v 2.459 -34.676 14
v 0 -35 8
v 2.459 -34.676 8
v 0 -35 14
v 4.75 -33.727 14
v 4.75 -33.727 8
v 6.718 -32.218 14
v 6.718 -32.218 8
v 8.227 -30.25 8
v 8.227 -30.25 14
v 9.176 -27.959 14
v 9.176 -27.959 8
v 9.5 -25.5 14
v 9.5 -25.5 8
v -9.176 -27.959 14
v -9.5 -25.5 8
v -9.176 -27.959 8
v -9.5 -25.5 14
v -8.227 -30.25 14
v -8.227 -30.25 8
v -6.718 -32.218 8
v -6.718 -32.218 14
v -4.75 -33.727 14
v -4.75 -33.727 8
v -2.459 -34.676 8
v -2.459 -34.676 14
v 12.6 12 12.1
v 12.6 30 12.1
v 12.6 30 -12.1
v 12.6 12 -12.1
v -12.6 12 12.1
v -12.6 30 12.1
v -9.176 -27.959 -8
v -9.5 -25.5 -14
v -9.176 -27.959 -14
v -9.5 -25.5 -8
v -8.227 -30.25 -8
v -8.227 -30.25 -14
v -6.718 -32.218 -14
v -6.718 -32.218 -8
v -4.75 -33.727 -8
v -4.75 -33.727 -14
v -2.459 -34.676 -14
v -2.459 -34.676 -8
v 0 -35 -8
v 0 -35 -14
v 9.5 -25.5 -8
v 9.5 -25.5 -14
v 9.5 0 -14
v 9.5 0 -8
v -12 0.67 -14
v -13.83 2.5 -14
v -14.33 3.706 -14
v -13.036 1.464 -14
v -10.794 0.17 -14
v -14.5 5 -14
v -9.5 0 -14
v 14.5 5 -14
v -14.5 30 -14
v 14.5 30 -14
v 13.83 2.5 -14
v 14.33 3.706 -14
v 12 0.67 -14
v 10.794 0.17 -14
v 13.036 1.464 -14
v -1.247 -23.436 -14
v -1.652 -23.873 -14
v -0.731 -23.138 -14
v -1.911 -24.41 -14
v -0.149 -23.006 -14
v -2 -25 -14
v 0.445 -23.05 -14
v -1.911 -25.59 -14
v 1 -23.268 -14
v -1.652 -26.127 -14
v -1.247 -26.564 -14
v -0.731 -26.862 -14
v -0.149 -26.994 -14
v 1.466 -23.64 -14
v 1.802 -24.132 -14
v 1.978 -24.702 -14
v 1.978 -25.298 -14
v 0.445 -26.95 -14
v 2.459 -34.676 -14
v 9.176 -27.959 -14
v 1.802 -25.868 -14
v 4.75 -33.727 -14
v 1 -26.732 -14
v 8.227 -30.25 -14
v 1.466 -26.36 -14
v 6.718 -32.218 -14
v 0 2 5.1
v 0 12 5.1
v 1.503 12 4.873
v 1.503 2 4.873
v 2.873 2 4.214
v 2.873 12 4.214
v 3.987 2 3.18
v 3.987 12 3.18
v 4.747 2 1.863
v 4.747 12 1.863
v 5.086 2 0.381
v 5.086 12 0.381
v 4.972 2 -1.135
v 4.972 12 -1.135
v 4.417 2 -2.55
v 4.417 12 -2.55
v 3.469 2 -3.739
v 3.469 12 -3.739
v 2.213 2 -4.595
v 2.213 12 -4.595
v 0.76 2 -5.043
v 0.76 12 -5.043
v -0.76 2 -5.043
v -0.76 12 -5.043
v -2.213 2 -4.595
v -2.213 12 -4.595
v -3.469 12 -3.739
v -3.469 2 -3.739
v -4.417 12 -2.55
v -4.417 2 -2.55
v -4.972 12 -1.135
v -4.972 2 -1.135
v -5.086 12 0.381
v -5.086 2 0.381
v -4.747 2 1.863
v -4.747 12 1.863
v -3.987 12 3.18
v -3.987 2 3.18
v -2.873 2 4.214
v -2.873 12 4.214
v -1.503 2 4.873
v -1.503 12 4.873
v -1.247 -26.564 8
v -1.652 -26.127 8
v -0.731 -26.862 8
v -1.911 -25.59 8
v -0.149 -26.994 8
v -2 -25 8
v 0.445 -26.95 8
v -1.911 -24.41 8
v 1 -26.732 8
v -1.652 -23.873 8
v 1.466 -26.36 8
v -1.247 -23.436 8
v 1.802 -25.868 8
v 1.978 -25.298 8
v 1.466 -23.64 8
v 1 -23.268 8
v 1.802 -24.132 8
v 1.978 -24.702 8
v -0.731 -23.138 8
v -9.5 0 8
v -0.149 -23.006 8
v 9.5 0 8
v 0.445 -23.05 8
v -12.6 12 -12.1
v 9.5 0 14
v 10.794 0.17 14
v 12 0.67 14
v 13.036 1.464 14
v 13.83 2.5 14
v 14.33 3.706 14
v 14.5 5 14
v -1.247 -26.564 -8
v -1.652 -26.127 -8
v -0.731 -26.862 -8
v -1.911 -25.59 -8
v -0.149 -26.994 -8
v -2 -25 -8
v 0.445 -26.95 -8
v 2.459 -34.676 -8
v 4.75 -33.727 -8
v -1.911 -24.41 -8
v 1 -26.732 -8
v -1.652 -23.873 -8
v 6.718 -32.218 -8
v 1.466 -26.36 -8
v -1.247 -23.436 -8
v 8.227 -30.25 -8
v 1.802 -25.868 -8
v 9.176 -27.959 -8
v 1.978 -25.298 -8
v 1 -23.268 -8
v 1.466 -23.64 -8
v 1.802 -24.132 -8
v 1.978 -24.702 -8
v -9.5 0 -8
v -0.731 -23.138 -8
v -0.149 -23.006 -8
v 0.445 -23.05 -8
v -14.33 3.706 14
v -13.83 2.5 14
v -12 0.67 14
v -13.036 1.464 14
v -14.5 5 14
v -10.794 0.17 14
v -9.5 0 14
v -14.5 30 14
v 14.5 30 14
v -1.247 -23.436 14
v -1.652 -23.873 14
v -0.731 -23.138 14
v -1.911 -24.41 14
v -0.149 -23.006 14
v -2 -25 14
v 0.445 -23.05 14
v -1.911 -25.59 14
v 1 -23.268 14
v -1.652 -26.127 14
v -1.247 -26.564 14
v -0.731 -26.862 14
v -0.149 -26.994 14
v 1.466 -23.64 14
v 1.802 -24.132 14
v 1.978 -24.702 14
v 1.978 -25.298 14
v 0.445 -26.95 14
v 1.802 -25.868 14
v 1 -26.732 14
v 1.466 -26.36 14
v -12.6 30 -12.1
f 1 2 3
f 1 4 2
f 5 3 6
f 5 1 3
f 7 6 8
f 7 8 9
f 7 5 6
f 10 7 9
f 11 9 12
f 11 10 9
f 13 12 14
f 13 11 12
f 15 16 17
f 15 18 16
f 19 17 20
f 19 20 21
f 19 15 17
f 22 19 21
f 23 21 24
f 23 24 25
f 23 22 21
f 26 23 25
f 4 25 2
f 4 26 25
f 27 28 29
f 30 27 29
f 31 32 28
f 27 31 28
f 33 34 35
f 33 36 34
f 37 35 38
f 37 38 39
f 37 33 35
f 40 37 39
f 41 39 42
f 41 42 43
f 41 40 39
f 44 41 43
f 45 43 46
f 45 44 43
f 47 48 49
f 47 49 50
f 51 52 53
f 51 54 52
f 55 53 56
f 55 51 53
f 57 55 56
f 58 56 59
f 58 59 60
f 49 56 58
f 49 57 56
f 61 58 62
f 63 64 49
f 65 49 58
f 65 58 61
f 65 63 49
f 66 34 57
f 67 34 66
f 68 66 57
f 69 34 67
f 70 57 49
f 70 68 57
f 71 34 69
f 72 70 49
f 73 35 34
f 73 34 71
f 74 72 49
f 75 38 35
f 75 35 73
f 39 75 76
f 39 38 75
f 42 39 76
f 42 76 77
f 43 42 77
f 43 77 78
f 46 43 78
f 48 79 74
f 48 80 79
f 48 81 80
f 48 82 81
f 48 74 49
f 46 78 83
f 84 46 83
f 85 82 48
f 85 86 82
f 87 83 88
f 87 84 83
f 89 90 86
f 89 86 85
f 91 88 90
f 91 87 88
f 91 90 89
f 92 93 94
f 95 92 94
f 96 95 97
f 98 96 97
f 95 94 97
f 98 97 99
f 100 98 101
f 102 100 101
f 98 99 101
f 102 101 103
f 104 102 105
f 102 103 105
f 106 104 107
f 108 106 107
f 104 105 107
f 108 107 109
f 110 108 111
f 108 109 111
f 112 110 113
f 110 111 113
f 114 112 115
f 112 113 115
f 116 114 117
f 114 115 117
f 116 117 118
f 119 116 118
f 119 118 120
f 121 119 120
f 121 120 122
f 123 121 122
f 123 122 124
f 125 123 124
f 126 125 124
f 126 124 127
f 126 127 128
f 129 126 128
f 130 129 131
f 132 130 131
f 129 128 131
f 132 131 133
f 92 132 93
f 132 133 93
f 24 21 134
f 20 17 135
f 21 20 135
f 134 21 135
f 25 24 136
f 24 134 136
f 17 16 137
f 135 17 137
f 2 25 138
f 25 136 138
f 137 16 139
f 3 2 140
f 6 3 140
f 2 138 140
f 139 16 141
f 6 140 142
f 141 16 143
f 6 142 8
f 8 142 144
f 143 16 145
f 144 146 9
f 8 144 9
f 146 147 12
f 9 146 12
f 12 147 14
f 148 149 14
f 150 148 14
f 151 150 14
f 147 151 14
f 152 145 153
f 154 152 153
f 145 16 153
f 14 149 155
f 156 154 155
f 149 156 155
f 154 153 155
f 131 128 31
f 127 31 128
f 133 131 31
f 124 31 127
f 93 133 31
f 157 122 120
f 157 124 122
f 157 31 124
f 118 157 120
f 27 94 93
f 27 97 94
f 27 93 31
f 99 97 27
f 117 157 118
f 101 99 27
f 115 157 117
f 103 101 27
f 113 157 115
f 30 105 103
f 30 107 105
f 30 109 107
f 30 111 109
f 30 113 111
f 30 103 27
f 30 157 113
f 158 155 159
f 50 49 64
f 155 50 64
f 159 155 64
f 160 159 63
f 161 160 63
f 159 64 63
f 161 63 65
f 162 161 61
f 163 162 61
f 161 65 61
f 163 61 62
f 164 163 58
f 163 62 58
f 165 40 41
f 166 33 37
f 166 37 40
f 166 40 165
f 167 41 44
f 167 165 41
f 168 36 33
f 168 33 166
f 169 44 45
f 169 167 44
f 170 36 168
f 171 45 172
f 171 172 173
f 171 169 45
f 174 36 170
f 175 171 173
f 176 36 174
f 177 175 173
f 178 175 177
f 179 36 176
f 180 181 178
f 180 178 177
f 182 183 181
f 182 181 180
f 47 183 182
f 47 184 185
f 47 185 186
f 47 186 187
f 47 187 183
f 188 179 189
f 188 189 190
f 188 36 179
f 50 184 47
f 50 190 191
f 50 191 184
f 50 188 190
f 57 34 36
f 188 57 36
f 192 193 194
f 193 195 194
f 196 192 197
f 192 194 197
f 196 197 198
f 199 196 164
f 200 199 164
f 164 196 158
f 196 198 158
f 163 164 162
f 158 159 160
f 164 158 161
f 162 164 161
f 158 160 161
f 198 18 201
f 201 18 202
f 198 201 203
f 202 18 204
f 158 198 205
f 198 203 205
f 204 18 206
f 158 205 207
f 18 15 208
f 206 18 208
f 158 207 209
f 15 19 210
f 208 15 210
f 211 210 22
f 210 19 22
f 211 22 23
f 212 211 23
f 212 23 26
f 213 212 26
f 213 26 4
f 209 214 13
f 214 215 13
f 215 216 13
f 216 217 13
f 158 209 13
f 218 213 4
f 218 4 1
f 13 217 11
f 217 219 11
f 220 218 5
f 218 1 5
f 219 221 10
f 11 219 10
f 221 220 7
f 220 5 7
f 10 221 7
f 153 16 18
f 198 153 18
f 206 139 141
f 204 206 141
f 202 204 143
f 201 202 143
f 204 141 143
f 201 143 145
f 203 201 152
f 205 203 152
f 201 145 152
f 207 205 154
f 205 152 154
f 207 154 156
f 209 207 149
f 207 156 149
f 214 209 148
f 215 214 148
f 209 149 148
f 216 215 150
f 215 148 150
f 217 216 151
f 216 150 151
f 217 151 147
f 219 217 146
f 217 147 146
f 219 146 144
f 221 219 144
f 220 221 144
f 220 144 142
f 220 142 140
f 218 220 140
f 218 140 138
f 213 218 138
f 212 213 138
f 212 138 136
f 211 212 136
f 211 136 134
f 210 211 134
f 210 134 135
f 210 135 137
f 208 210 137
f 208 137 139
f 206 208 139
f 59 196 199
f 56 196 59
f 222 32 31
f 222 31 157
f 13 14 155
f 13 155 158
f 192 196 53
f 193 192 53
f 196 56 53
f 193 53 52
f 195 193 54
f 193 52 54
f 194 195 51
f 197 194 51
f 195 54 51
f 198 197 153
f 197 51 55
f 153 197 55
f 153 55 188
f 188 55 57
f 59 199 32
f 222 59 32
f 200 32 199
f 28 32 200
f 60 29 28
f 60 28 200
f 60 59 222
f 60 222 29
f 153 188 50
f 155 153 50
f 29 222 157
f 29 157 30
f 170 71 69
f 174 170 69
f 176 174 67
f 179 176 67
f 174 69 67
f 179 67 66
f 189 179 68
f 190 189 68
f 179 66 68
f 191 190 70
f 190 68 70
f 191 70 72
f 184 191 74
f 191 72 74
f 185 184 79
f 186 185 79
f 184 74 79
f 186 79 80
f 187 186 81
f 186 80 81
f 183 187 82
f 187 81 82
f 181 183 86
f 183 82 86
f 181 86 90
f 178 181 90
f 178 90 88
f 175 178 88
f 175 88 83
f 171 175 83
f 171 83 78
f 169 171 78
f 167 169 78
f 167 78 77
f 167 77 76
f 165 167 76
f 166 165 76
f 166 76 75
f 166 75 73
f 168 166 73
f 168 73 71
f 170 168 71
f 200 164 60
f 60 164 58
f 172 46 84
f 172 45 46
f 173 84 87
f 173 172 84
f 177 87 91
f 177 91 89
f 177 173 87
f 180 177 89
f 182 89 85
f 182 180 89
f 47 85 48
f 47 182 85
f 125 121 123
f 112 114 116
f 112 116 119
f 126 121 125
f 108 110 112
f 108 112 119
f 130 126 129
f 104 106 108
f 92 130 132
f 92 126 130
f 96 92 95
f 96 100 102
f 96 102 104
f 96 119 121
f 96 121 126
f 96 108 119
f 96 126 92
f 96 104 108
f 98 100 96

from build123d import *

# Parameters (mm, degrees)
SKETCH_1_W          = 29
SKETCH_1_H          = 28
EXTRUDE_3_DEPTH     = 30
SKETCH_2_W          = 19
SKETCH_2_H          = 6
EXTRUDE_4_DEPTH     = 35
SKETCH_3_R          = 2
CUT_EXTRUDE_3_DEPTH = 48.108916353
SKETCH_4_W          = 25.2
SKETCH_4_H          = 24.2
CUT_EXTRUDE_4_DEPTH = 18
CUT_EXTRUDE_START   = -18
SKETCH_4_3_R        = 5.1
CUT_EXTRUDE_5_DEPTH = 10
FILLET_1_R          = 5
FILLET_2_R          = 9.5


with BuildPart() as part:
    # 草图1 → 凸台-拉伸3 (new body)
    with BuildSketch(Plane(origin=(0, 0, 0), x_dir=(1, 0, 0), z_dir=(0, 1, 0))):
        Rectangle(SKETCH_1_W, SKETCH_1_H)
    extrude(amount=EXTRUDE_3_DEPTH)

    # 草图2 → 凸台-拉伸4 (add)
    with BuildSketch(Plane.XZ):
        with Locations((0, -11)):
            Rectangle(SKETCH_2_W, SKETCH_2_H)
        with Locations((0, 11)):
            Rectangle(SKETCH_2_W, SKETCH_2_H)
    extrude(amount=EXTRUDE_4_DEPTH)

    # 草图3 → 切除-拉伸3 (cut, through all)
    with BuildSketch(Plane(origin=(0, 0, -14), x_dir=(-1, 0, 0), z_dir=(0, 0, -1))):
        with Locations((0, -25)):
            Circle(SKETCH_3_R)
    extrude(amount=-CUT_EXTRUDE_3_DEPTH, mode=Mode.SUBTRACT)

    # 草图4 → 切除-拉伸4 (cut)
    with BuildSketch(Plane(origin=(0, 30, 0), x_dir=(1, 0, 0), z_dir=(0, 1, 0))):
        Rectangle(SKETCH_4_W, SKETCH_4_H)
    extrude(amount=-CUT_EXTRUDE_4_DEPTH, mode=Mode.SUBTRACT)

    # 草图4<3> → 切除-拉伸5 (cut)
    with BuildSketch(Plane(origin=(0, 30, 0), x_dir=(1, 0, 0), z_dir=(0, 1, 0)).offset(CUT_EXTRUDE_START)):
        with Locations(Location((0, 0, 0), (0, 0, 270))):
            Circle(SKETCH_4_3_R)
    extrude(amount=-CUT_EXTRUDE_5_DEPTH, mode=Mode.SUBTRACT)

    # 圆角1
    fillet_1_edges = [part.edges().sort_by_distance(p)[0] for p in [
        (-14.5, 0, 0),
        (14.5, 0, 0),
    ]]
    fillet(fillet_1_edges, radius=FILLET_1_R)

    # 圆角2
    fillet_2_edges = [part.edges().sort_by_distance(p)[0] for p in [
        (9.5, -35, -11),
        (-9.5, -35, -11),
        (9.5, -35, 11),
        (-9.5, -35, 11),
    ]]
    fillet(fillet_2_edges, radius=FILLET_2_R - 0.0001)  # a hair under: the kernel refuses the full size


solid = part.part
